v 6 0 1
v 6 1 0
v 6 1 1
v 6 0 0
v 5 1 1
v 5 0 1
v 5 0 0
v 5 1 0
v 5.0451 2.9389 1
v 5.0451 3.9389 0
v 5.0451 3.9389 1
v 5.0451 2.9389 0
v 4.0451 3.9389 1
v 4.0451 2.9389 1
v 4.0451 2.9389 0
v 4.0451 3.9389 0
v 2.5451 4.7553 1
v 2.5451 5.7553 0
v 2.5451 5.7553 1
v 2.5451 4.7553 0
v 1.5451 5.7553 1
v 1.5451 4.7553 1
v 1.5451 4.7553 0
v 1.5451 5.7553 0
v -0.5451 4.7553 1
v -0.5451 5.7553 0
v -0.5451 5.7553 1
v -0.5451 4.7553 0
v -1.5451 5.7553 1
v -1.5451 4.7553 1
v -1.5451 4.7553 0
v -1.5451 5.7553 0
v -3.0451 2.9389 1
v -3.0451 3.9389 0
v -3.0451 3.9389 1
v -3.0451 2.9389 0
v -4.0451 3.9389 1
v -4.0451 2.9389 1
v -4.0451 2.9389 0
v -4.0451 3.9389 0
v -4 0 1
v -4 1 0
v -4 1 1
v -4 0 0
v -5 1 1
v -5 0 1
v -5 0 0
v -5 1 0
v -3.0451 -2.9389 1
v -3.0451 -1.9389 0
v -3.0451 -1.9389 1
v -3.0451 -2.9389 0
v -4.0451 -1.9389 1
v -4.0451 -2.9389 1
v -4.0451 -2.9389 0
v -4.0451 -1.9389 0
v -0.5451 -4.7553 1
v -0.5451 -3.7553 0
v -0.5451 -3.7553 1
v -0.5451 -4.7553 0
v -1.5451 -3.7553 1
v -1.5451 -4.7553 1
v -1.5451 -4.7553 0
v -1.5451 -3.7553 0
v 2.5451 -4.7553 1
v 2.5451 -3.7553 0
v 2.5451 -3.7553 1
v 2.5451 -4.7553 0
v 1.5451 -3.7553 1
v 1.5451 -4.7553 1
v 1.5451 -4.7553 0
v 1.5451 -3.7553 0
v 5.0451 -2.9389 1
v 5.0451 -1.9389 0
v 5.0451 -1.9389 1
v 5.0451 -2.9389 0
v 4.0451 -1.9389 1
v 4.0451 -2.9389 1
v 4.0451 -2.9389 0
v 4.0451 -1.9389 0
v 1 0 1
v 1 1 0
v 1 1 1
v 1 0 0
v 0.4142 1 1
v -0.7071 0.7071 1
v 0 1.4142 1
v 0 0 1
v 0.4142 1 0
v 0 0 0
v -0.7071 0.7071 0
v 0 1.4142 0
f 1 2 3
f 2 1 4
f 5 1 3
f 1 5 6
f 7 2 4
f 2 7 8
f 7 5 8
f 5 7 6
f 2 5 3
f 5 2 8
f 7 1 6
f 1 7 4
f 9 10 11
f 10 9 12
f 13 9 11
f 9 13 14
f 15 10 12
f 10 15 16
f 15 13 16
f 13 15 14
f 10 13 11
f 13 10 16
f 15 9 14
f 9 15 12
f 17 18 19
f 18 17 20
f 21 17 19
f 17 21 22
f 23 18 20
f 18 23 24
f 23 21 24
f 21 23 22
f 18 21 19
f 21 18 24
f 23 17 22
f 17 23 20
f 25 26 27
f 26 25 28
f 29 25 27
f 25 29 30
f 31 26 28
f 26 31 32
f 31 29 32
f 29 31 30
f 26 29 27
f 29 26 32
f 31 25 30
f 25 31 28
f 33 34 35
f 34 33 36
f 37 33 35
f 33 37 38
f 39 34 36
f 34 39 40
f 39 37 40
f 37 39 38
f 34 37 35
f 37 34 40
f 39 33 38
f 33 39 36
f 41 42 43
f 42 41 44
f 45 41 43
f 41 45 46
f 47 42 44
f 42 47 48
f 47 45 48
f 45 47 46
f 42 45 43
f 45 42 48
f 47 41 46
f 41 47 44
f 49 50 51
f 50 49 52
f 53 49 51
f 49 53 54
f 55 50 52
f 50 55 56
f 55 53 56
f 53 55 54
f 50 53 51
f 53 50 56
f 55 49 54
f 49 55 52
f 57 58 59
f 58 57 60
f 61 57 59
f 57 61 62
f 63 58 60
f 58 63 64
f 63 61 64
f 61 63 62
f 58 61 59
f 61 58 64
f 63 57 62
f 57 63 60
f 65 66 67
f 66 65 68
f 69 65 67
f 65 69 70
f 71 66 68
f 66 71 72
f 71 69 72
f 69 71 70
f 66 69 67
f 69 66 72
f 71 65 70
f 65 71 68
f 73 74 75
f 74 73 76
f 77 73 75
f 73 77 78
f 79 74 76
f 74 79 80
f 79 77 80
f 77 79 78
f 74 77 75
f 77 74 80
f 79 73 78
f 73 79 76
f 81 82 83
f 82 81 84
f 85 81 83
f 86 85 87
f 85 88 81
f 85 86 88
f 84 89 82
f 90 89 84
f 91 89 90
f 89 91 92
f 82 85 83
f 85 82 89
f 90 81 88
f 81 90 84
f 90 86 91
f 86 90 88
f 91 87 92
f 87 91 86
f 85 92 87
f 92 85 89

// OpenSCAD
// Generated by SolidPython 0.4.2 on 2021-05-12 12:55:15


union() {
	cube(size = 1);
	union() {
		translate(v = [5.0, 0.0, 0]) {
			cube(size = 1);
		}
		translate(v = [4.045084971874737, 2.938926261462366, 0]) {
			cube(size = 1);
		}
		translate(v = [1.5450849718747373, 4.755282581475767, 0]) {
			cube(size = 1);
		}
		translate(v = [-1.5450849718747368, 4.755282581475768, 0]) {
			cube(size = 1);
		}
		translate(v = [-4.045084971874736, 2.9389262614623664, 0]) {
			cube(size = 1);
		}
		translate(v = [-5.0, 6.123233995736766e-16, 0]) {
			cube(size = 1);
		}
		translate(v = [-4.045084971874738, -2.938926261462365, 0]) {
			cube(size = 1);
		}
		translate(v = [-1.5450849718747377, -4.755282581475767, 0]) {
			cube(size = 1);
		}
		translate(v = [1.5450849718747361, -4.755282581475768, 0]) {
			cube(size = 1);
		}
		translate(v = [4.045084971874736, -2.938926261462367, 0]) {
			cube(size = 1);
		}
	}
	rotate(a = [0, 0, 45]) {
		cube(size = 1);
	}
}
